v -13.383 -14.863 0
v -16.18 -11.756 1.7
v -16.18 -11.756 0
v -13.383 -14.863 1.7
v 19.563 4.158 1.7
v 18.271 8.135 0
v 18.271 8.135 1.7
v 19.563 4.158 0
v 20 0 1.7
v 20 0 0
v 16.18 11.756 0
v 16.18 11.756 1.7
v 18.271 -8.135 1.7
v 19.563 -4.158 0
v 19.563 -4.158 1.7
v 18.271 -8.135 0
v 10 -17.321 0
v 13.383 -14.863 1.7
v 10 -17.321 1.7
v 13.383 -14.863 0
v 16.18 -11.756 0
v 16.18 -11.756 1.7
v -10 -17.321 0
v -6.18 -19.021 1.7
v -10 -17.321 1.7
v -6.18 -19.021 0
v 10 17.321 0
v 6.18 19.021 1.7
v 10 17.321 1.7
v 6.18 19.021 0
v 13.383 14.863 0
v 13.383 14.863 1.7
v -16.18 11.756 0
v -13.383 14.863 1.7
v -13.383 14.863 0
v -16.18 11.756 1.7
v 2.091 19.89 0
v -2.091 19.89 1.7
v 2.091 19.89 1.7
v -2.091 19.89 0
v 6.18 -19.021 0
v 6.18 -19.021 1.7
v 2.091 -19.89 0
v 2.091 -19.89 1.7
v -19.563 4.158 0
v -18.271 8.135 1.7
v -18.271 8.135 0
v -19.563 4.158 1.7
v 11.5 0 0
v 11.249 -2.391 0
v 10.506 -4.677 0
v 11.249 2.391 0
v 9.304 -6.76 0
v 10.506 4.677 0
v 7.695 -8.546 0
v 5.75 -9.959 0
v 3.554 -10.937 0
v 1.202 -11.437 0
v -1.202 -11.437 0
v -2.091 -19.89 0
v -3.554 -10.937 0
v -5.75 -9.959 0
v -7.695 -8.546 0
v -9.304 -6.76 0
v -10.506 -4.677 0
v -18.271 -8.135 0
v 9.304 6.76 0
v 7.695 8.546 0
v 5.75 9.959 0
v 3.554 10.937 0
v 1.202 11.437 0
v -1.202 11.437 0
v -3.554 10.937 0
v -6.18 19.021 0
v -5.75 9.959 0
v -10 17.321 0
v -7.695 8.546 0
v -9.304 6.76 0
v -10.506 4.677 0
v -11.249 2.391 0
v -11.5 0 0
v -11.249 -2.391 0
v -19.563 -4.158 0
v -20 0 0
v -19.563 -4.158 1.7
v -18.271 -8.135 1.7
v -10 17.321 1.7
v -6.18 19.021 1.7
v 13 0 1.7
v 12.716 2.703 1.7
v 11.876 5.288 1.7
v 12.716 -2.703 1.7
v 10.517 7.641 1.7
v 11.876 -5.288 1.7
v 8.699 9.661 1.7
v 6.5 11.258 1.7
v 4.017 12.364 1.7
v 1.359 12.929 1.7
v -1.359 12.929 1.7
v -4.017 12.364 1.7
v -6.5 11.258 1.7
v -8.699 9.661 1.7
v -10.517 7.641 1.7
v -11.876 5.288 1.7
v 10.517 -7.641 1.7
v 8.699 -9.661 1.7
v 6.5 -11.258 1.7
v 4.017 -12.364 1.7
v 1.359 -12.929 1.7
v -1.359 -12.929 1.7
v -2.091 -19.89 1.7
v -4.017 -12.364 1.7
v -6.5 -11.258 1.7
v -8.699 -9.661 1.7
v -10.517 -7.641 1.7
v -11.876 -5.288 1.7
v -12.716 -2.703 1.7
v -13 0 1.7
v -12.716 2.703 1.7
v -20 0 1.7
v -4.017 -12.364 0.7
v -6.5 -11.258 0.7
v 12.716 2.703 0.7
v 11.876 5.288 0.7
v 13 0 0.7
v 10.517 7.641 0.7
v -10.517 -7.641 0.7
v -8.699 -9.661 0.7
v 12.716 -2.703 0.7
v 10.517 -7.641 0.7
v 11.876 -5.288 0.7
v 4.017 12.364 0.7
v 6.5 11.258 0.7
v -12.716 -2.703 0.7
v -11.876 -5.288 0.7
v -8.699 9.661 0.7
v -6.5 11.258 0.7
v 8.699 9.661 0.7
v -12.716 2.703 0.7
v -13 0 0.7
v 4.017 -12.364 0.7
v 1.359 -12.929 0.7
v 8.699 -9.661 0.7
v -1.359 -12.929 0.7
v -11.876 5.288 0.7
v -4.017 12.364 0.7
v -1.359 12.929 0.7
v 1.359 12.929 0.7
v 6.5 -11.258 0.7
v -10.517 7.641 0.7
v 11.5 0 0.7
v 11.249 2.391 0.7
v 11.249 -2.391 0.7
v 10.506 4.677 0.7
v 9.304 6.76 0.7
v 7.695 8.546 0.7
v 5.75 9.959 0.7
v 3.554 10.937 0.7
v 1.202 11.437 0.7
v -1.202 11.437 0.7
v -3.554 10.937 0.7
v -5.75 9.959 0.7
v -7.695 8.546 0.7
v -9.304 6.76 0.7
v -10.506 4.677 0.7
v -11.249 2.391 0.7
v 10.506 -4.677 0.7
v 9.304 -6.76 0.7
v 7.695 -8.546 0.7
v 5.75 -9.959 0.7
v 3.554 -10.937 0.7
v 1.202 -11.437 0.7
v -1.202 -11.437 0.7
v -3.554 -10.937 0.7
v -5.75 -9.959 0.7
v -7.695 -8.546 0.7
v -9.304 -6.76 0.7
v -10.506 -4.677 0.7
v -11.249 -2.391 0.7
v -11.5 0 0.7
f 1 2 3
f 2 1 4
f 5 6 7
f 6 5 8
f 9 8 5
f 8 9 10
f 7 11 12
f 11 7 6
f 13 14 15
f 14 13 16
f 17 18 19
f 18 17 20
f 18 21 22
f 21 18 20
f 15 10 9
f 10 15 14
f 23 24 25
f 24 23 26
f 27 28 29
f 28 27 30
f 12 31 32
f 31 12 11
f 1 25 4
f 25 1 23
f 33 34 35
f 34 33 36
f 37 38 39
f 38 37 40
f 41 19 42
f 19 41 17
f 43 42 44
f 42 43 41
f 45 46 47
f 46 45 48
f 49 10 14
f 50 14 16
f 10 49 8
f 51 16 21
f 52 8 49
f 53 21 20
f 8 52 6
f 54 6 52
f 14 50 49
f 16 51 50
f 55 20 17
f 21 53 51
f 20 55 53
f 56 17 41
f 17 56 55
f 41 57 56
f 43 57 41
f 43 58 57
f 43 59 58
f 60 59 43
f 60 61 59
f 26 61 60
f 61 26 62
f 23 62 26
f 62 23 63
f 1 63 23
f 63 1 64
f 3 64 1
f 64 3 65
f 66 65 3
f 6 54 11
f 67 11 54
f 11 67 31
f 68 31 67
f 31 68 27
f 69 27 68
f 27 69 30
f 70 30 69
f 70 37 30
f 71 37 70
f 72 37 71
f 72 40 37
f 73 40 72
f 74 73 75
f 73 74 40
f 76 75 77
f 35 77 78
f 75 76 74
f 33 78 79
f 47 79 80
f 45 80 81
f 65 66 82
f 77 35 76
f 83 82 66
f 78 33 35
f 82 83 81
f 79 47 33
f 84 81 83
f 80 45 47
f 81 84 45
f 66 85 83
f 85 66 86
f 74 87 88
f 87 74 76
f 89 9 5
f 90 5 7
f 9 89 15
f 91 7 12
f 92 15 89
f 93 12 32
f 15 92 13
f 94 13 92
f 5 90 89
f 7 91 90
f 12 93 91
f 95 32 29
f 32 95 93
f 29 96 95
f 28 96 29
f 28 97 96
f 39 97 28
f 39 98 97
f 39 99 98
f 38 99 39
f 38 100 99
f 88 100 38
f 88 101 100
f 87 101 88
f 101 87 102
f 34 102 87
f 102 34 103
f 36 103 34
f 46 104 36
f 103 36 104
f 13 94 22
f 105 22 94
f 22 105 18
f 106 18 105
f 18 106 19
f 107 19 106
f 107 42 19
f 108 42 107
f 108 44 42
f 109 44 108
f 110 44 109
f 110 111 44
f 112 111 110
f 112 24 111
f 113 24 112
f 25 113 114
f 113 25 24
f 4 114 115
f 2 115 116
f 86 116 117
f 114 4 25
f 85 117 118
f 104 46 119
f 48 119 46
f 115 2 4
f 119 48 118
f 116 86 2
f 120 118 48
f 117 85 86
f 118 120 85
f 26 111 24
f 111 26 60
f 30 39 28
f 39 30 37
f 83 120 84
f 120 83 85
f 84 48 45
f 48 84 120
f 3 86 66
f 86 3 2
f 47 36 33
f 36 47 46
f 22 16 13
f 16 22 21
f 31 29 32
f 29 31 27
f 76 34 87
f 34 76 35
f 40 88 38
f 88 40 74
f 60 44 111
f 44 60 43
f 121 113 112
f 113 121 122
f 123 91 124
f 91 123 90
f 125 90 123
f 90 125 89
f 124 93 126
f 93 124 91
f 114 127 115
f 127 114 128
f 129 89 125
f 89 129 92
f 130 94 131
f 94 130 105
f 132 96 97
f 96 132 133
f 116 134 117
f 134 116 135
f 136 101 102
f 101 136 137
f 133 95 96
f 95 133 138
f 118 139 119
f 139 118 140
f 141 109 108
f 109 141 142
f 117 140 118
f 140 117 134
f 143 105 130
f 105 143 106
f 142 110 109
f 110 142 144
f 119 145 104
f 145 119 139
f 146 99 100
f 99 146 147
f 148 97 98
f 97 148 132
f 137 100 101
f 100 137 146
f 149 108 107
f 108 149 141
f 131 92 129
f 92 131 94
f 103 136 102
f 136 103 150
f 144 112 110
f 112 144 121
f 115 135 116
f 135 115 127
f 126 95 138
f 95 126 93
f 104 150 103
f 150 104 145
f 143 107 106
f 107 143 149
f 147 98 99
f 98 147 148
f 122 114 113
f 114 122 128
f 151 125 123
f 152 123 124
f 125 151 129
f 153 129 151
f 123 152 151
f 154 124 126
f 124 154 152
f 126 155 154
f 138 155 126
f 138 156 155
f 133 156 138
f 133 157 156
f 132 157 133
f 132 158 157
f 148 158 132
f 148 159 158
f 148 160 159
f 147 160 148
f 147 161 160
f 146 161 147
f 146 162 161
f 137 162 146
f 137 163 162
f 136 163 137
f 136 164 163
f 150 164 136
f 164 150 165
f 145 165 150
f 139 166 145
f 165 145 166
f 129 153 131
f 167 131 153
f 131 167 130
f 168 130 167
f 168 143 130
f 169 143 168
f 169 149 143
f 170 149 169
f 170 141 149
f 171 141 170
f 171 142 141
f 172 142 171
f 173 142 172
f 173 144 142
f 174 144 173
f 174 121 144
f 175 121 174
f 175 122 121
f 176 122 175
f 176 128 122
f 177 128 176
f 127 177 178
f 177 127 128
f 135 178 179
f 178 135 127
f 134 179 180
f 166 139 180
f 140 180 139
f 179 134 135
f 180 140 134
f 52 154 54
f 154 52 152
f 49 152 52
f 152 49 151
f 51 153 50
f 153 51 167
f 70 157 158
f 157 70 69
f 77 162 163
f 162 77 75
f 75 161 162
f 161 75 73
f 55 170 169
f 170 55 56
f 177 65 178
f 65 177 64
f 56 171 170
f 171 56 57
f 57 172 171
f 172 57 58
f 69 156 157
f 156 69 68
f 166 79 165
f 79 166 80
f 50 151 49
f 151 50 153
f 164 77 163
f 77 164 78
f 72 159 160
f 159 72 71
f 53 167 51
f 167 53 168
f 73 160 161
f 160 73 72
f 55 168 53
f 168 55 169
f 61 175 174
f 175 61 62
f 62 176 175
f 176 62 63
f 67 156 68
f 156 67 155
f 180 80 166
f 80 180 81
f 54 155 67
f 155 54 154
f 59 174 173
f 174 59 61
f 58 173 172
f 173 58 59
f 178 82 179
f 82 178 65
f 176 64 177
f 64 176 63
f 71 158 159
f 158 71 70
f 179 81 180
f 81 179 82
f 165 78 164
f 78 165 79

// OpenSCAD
// Very simple adapter to hold a 1 inch disc on the microscope
// This is useful if you've got a 1 inch calibration target.
// This file is CC-0 public domain.

difference(){
    cylinder(d=40,h=1.7);

    translate([0,0,0.7]) cylinder(d=26,h=999);
    cylinder(d=23, h=999, center=true);
}
